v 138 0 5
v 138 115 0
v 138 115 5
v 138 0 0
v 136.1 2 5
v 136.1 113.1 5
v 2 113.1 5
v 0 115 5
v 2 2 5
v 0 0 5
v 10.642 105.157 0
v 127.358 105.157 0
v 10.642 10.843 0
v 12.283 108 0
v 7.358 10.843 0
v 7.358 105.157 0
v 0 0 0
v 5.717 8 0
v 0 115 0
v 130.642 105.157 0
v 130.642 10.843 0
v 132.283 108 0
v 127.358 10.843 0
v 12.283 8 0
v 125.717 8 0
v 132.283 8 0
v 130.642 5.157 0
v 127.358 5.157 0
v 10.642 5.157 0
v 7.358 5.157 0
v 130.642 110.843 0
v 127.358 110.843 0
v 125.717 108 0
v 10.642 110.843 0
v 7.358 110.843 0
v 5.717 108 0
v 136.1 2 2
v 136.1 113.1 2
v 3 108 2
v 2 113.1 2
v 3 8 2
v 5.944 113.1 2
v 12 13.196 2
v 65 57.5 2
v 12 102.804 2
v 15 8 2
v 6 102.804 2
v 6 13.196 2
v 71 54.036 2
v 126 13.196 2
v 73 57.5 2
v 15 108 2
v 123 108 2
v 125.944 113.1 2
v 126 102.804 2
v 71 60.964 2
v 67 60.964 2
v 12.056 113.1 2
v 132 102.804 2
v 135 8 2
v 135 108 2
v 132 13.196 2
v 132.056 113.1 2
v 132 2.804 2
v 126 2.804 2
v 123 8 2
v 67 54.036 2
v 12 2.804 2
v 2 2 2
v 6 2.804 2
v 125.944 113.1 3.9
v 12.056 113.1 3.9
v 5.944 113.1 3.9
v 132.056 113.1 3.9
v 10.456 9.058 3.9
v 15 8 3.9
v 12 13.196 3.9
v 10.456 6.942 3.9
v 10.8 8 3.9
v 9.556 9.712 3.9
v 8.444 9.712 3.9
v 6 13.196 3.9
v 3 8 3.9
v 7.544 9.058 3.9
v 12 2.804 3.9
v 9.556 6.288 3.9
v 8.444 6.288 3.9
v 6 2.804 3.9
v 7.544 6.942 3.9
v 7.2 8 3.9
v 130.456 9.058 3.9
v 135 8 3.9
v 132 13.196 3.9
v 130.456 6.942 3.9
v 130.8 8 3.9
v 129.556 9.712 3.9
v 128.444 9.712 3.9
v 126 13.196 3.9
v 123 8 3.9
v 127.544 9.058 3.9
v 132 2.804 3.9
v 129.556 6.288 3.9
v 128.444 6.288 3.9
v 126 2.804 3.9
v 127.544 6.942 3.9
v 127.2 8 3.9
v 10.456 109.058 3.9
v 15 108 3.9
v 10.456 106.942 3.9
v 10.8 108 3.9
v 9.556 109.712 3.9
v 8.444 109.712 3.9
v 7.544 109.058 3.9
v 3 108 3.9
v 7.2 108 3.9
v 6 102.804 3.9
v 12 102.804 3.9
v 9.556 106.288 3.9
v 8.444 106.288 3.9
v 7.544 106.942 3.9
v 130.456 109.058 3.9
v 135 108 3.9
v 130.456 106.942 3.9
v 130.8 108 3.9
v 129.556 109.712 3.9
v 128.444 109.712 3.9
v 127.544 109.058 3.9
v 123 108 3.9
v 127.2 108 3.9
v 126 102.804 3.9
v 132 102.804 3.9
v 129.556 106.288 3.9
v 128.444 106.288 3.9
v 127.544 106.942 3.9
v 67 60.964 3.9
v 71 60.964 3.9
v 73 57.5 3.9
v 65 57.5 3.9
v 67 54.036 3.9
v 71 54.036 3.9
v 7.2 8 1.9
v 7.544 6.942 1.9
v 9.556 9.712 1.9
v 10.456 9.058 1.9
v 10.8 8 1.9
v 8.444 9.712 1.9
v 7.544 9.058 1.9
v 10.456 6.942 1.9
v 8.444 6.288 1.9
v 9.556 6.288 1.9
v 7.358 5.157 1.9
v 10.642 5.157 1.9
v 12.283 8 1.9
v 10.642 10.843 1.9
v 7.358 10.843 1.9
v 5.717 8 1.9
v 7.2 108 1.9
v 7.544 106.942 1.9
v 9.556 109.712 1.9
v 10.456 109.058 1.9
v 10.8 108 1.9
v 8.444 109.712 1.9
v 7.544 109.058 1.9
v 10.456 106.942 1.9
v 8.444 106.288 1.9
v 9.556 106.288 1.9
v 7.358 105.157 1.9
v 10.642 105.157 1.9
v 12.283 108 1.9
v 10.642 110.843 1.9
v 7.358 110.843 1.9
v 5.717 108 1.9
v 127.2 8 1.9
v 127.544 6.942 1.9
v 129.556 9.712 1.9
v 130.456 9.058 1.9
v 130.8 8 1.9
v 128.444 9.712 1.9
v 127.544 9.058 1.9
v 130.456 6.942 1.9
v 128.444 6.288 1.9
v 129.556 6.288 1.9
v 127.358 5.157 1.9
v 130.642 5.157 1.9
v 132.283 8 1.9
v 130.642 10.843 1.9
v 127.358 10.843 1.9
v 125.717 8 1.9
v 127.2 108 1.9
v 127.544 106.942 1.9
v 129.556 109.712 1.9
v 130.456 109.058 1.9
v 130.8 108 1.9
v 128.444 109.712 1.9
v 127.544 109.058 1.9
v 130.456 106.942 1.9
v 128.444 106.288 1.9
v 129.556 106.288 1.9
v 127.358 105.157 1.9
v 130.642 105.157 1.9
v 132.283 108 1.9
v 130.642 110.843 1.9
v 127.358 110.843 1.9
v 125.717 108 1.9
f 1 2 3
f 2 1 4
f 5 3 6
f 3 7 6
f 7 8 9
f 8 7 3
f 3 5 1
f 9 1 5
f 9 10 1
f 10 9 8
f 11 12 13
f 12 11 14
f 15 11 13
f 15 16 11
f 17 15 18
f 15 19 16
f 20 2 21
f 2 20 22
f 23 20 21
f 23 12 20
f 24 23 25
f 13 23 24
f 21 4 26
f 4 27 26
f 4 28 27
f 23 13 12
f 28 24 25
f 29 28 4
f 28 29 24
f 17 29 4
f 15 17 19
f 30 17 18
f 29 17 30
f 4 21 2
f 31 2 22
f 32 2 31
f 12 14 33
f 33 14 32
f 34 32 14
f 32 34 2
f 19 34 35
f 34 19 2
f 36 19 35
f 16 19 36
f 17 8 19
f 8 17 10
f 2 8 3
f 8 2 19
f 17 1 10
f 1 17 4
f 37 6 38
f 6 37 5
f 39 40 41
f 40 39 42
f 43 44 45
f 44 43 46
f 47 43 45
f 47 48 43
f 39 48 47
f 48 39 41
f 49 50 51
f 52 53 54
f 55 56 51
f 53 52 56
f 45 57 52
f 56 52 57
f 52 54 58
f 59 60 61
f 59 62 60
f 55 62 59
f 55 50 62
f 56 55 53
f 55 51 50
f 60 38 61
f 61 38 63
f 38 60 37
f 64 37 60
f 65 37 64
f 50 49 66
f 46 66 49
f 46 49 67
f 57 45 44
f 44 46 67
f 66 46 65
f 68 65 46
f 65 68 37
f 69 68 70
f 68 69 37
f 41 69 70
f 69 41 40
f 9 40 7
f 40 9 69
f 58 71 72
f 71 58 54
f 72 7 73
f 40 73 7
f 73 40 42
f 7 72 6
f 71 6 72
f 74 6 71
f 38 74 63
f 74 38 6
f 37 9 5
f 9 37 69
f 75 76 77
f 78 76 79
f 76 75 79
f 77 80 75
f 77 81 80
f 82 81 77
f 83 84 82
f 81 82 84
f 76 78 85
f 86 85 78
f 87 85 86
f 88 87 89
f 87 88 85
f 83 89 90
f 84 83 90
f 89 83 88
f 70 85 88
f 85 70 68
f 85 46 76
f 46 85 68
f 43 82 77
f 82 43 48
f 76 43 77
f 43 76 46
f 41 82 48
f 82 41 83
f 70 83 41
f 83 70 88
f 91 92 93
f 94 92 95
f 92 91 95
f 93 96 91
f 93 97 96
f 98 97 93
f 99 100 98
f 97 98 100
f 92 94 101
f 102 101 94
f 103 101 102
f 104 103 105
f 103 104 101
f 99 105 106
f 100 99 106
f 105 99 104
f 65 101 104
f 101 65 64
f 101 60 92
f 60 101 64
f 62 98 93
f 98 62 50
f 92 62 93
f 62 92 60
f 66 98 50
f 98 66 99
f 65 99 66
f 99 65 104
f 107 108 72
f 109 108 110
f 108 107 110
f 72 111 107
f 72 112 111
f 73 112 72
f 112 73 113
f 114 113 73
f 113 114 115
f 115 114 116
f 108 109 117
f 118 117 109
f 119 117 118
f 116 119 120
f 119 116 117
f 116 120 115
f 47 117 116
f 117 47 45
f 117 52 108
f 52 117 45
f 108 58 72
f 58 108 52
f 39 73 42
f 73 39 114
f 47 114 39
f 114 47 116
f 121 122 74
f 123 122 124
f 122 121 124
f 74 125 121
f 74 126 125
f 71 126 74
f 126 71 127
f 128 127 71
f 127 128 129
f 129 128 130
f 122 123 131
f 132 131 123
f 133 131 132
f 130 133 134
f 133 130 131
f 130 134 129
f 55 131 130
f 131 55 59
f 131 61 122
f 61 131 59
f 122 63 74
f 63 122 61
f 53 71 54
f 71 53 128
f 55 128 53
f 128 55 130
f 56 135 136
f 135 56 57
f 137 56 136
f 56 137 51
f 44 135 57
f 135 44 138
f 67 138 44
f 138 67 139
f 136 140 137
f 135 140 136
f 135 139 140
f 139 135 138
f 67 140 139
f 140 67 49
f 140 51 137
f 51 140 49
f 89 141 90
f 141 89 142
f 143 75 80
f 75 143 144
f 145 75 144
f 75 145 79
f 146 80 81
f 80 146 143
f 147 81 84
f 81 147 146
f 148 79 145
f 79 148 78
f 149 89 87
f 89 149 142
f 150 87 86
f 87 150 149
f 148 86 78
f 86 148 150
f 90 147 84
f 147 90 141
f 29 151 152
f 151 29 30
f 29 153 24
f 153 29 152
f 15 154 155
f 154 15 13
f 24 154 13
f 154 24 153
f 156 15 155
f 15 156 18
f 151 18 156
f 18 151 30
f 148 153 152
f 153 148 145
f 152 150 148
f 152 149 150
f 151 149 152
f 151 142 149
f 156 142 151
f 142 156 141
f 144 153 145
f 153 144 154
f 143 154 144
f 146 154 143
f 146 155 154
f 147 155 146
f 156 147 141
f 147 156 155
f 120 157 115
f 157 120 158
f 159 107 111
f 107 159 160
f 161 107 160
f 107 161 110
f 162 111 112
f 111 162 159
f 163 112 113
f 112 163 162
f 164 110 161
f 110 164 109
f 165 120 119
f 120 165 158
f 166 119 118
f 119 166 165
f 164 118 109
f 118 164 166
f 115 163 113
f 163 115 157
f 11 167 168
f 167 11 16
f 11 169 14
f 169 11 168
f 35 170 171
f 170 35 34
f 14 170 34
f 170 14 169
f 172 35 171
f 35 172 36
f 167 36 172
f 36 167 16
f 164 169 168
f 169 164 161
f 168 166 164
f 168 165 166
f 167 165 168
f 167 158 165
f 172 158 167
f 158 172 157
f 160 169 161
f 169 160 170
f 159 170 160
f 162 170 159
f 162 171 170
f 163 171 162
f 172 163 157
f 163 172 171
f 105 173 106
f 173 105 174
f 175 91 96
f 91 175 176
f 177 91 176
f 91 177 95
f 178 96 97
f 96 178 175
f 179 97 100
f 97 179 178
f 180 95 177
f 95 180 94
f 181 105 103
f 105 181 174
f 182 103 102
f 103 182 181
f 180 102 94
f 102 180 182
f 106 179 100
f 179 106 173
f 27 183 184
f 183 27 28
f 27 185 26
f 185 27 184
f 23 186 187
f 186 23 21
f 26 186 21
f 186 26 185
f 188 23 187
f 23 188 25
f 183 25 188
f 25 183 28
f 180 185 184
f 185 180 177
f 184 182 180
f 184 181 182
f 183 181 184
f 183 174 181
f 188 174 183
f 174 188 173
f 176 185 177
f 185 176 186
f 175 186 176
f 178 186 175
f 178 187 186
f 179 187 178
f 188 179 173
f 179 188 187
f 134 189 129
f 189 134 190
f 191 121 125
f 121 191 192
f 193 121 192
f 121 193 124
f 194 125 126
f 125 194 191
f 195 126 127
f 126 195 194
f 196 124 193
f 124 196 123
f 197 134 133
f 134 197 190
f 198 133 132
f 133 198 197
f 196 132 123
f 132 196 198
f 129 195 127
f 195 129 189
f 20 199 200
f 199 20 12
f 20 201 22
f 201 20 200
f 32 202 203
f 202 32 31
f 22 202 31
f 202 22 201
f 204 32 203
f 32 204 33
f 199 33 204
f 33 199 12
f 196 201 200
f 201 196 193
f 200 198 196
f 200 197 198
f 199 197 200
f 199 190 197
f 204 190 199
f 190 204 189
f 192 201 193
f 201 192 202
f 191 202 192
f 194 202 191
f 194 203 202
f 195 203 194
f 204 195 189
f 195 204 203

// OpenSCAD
tol = 0.5;
pcb_x = 130;
pcb_y = 110;
pcb_z = 4;
bolt_d = 3.6;
shift_bolt = 5;

// box thickness
th = 2;

shift_x = 4;
shift_y = th + 1;

box_x = pcb_x + shift_x + 4;
box_y = pcb_y + shift_y + th;

pcb_width = 2;
pcb_up = 2;

box_z = th + pcb_up + pcb_width - 1;

socket_h = 15;
socket_w = 10;
socket_n = 5;
socket_int = 20;
start_socket_x = 20 + shift_x;
start_socket_z = th + pcb_z + tol;
eps = 1e-1;

usb_type_b_w = 12;
usb_type_b_h = 11;
start_type_b_y = shift_y + 81.5;
//start_type_b_z = th + pcb_z + tol;

usb_type_a_w = 13.4;
usb_type_a_h = 7.3;
start_type_a_y = shift_y + 47;
//start_type_a_z = th + pcb_z + tol;

// programmator
micro_x = 10;
micro_y = 21.1;
micro_start_x = shift_x + 4.75;
micro_start_y = shift_y + pcb_y - 23.3 - micro_y;

contrast_start_x = shift_x + 38.4;
contrast_start_y = shift_y + 25.7;
volume_start_x = shift_x + pcb_x - 39.2;
volume_start_y = contrast_start_y;
pot_d = 7;
fn = 10;
gaika_h = 2;
gaika_w = 5.6;
stoiki_r = 4;
wide_stoiki_r = stoiki_r + 2;



translate([0,0,-50]) {

!difference() {
  union() {
    difference() {
      cube([box_x,box_y,box_z], false);
      translate([th, th, th]) {
        cube([box_x-2*th+eps, box_y-2*th+eps, box_z-th+eps], false);
      }
    }
    // stoiki
    for (dy = [shift_y+shift_bolt, shift_y+pcb_y-shift_bolt]) {
      for (dx = [shift_x+shift_bolt, shift_x+pcb_x-shift_bolt]) {
        translate([dx,dy,th-eps]) {
          cylinder($fn=6, r=stoiki_r, h=pcb_up);
          cylinder($fn=6, r=wide_stoiki_r, h=gaika_h);
        }
      }
    }
    translate([box_x/2, box_y/2, th-eps]) {
      cylinder($fn=6, r=stoiki_r, h=pcb_up);
    }
  }

  // bolts
  for (dx = [shift_x+shift_bolt, shift_x+pcb_x-shift_bolt]) {
    for (dy = [shift_y+shift_bolt, shift_y+pcb_y-shift_bolt]) {
      translate([dx,dy,-eps]) {
        cylinder($fn=fn, r=bolt_d/2, h=th+pcb_up+2*eps);
        // gaika
        cylinder($fn=6, r=gaika_w / 2 / cos(30) + 0.05, h=gaika_h);
      }
    }
  }

//    for (i = [0:1:socket_n-1]) {
//        translate([start_socket_x+i*socket_int-tol, box_y-th-eps, start_socket_z]) {
//            cube(size=[socket_w+2*tol, th+2*eps, box_z]);
//        }
//    }

//    // usb_in1 type b
//    translate([box_x-th-eps, start_type_b_y-tol, start_type_b_z]) {
//        cube(size=[th+2*eps, usb_type_b_w+2*tol, box_z]);
//    }

//    // usb_out1 type a
//    translate([-eps, start_type_a_y - tol, start_type_a_z]) {
//        cube(size=[th+2*eps, usb_type_a_w + 2*tol, box_z]);
//    }

    // programmator
    //translate([micro_start_x-tol,micro_start_y-tol, -eps]) {
      //cube(size=[micro_x+2*tol, micro_y+2*tol, th+2*eps]);
    //}

    // contrast
    //translate([contrast_start_x, contrast_start_y, -eps]) {
      //cylinder($fn=fn, r=pot_d/2, h=th+2*eps);
    //}

    // volume
//    translate([volume_start_x, volume_start_y, -eps]) {
//      cylinder($fn=20, r=pot_d/2, h=th+2*eps);
//    }
}
}

top_box_z = 15 + th;
stoiki_h = top_box_z - th;
wide_stoiki_h = 2;
pcb_room = 0.5;
screen_start_x = shift_x + 28;
screen_start_y = shift_y + 40;
screen_length_x = 72;
screen_length_y = 24;
screen_hold_x = 40;
screen_hold_y = 4;
screen_hold_start_z = 12;
screen_hold_y_shift = 2;
screen_hold_up_x = 25;
screen_hold_up_x_shift = 5;

master_button_y = shift_y + 10;
master_button_x = shift_x + 43;
master_button_int = 21.8;
master_button_r = 3;
top_bolt_h = 1.5;
top_bolt_r = 3.5;
speaker_shift = 18;
speaker_r = 15;
speaker_h = 15;
speaker_hole_d = 10;
speaker_hole_int = 3;
speaker_hole_w = 1.5;
speaker_shift = 18;

difference() {
  union() {
    difference() {
      cube([box_x,box_y,top_box_z], false);
      translate([th, th, -eps]) {
        cube([box_x-2*th+eps, box_y-2*th+eps, top_box_z-th+eps], false);
      }
    }
    // stoiki
    for (dx = [shift_x+shift_bolt, shift_x+pcb_x-shift_bolt]) {
      for (dy = [shift_y+shift_bolt, shift_y+pcb_y-shift_bolt]) {
        translate([dx,dy,pcb_room]) {
	  cylinder($fn=6, r=stoiki_r, h=top_box_z-th+eps);
        }
        translate([dx,dy,top_box_z-th-wide_stoiki_h+eps]) {
	  cylinder($fn=6, r=wide_stoiki_r, h=wide_stoiki_h+th-2*eps);
        }
      }
    }
    // screen_hold
    translate([screen_start_x + (screen_length_x - screen_hold_x)/2, screen_start_y - screen_hold_y_shift - screen_hold_y, screen_hold_start_z]) {
	cube([screen_hold_x, screen_hold_y, top_box_z - screen_hold_start_z - th + eps]);
    }
    translate([screen_start_x + screen_length_x - screen_hold_up_x - screen_hold_up_x_shift, screen_start_y + screen_length_y + screen_hold_y_shift, screen_hold_start_z]) {
	cube([screen_hold_up_x, screen_hold_y, top_box_z - screen_hold_start_z - th + eps]);
    }
  }
  // - speaker na stoikah
  translate([shift_x + pcb_x - 18, shift_y + 18, 0]) {
    cylinder(r=speaker_r, h = 15, $fn=20);
  }
  // speaker_hole
  for (dy = [shift_y + speaker_shift - speaker_hole_int - speaker_hole_w*3/2, 
             shift_y + speaker_shift - speaker_hole_w/2, 
             shift_y + speaker_shift + speaker_hole_int + speaker_hole_w/2]) { 
    translate([shift_x + pcb_x - speaker_shift - speaker_hole_d, dy, top_box_z-th-eps]) {
      cube(size=[speaker_hole_d, speaker_hole_w, th + 2*eps]);
    }
  }

  // bolts
  for (dx = [shift_x+shift_bolt, shift_x+pcb_x-shift_bolt]) {
    for (dy = [shift_y+shift_bolt, shift_y+pcb_y-shift_bolt]) {
      translate([dx,dy,-eps]) {
        cylinder($fn=fn, r=bolt_d/2, h=top_box_z+2*eps);
      }
      translate([dx, dy, top_box_z - top_bolt_h]) {
        cylinder($fn=6, r=top_bolt_r, h=top_bolt_h + eps);
      }
    }
  }

  // screen
  translate([screen_start_x, screen_start_y, top_box_z - th - eps]) {
      cube([screen_length_x, screen_length_y + tol, th + 2*eps]);
  }
  // sockets
  for (i = [0:1:socket_n-1]) {
      translate([start_socket_x+i*socket_int-tol, box_y-th-eps, -eps]) {
	  cube(size=[socket_w+2*tol, th+2*eps, socket_h]);
      }
  }
  // type_b
  translate([box_x - th - eps, start_type_b_y - tol, -tol]) {
      cube([th + 2*eps, usb_type_b_w + 2*tol, usb_type_b_h + 2*tol]);
  }
  // type_a
  translate([-eps, start_type_a_y, -eps]) {
      cube([th + 2*eps, usb_type_a_w+eps, usb_type_a_h+2*eps]);
  }
  // master buttons
  for (i = [0:1:2]) {
    translate([master_button_x + master_button_int*i, master_button_y, top_box_z - th - eps]) {
      cylinder($fn=fn, r=master_button_r+tol, h=th+2*eps);
    }
  }
}


//// bolts
//for (dx = [shift_x+shift_bolt, shift_x+pcb_x-shift_bolt]) {
//  for (dy = [shift_y+shift_bolt, shift_y+pcb_y-shift_bolt]) {
//    difference() {
//      translate([dx,dy,pcb_up/2+th]) {
//        cube(size=[a,a,pcb_up], center=true);
//      }
//      translate([dx,dy,-eps]) {
//        cylinder($fn=20, r=bolt_d/2, h=th+pcb_up+2*eps);
//      }
//    }
//  }
//}


//leg_r = t;
//shift = t/2+leg_r;
//for (dx = [shift, a-shift])
//    for (dy = [shift, b-shift]) {
//        translate([dx, dy, 0]) {
//            cylinder(h=c, r=leg_r, $fn=40);
//        }
//    }
